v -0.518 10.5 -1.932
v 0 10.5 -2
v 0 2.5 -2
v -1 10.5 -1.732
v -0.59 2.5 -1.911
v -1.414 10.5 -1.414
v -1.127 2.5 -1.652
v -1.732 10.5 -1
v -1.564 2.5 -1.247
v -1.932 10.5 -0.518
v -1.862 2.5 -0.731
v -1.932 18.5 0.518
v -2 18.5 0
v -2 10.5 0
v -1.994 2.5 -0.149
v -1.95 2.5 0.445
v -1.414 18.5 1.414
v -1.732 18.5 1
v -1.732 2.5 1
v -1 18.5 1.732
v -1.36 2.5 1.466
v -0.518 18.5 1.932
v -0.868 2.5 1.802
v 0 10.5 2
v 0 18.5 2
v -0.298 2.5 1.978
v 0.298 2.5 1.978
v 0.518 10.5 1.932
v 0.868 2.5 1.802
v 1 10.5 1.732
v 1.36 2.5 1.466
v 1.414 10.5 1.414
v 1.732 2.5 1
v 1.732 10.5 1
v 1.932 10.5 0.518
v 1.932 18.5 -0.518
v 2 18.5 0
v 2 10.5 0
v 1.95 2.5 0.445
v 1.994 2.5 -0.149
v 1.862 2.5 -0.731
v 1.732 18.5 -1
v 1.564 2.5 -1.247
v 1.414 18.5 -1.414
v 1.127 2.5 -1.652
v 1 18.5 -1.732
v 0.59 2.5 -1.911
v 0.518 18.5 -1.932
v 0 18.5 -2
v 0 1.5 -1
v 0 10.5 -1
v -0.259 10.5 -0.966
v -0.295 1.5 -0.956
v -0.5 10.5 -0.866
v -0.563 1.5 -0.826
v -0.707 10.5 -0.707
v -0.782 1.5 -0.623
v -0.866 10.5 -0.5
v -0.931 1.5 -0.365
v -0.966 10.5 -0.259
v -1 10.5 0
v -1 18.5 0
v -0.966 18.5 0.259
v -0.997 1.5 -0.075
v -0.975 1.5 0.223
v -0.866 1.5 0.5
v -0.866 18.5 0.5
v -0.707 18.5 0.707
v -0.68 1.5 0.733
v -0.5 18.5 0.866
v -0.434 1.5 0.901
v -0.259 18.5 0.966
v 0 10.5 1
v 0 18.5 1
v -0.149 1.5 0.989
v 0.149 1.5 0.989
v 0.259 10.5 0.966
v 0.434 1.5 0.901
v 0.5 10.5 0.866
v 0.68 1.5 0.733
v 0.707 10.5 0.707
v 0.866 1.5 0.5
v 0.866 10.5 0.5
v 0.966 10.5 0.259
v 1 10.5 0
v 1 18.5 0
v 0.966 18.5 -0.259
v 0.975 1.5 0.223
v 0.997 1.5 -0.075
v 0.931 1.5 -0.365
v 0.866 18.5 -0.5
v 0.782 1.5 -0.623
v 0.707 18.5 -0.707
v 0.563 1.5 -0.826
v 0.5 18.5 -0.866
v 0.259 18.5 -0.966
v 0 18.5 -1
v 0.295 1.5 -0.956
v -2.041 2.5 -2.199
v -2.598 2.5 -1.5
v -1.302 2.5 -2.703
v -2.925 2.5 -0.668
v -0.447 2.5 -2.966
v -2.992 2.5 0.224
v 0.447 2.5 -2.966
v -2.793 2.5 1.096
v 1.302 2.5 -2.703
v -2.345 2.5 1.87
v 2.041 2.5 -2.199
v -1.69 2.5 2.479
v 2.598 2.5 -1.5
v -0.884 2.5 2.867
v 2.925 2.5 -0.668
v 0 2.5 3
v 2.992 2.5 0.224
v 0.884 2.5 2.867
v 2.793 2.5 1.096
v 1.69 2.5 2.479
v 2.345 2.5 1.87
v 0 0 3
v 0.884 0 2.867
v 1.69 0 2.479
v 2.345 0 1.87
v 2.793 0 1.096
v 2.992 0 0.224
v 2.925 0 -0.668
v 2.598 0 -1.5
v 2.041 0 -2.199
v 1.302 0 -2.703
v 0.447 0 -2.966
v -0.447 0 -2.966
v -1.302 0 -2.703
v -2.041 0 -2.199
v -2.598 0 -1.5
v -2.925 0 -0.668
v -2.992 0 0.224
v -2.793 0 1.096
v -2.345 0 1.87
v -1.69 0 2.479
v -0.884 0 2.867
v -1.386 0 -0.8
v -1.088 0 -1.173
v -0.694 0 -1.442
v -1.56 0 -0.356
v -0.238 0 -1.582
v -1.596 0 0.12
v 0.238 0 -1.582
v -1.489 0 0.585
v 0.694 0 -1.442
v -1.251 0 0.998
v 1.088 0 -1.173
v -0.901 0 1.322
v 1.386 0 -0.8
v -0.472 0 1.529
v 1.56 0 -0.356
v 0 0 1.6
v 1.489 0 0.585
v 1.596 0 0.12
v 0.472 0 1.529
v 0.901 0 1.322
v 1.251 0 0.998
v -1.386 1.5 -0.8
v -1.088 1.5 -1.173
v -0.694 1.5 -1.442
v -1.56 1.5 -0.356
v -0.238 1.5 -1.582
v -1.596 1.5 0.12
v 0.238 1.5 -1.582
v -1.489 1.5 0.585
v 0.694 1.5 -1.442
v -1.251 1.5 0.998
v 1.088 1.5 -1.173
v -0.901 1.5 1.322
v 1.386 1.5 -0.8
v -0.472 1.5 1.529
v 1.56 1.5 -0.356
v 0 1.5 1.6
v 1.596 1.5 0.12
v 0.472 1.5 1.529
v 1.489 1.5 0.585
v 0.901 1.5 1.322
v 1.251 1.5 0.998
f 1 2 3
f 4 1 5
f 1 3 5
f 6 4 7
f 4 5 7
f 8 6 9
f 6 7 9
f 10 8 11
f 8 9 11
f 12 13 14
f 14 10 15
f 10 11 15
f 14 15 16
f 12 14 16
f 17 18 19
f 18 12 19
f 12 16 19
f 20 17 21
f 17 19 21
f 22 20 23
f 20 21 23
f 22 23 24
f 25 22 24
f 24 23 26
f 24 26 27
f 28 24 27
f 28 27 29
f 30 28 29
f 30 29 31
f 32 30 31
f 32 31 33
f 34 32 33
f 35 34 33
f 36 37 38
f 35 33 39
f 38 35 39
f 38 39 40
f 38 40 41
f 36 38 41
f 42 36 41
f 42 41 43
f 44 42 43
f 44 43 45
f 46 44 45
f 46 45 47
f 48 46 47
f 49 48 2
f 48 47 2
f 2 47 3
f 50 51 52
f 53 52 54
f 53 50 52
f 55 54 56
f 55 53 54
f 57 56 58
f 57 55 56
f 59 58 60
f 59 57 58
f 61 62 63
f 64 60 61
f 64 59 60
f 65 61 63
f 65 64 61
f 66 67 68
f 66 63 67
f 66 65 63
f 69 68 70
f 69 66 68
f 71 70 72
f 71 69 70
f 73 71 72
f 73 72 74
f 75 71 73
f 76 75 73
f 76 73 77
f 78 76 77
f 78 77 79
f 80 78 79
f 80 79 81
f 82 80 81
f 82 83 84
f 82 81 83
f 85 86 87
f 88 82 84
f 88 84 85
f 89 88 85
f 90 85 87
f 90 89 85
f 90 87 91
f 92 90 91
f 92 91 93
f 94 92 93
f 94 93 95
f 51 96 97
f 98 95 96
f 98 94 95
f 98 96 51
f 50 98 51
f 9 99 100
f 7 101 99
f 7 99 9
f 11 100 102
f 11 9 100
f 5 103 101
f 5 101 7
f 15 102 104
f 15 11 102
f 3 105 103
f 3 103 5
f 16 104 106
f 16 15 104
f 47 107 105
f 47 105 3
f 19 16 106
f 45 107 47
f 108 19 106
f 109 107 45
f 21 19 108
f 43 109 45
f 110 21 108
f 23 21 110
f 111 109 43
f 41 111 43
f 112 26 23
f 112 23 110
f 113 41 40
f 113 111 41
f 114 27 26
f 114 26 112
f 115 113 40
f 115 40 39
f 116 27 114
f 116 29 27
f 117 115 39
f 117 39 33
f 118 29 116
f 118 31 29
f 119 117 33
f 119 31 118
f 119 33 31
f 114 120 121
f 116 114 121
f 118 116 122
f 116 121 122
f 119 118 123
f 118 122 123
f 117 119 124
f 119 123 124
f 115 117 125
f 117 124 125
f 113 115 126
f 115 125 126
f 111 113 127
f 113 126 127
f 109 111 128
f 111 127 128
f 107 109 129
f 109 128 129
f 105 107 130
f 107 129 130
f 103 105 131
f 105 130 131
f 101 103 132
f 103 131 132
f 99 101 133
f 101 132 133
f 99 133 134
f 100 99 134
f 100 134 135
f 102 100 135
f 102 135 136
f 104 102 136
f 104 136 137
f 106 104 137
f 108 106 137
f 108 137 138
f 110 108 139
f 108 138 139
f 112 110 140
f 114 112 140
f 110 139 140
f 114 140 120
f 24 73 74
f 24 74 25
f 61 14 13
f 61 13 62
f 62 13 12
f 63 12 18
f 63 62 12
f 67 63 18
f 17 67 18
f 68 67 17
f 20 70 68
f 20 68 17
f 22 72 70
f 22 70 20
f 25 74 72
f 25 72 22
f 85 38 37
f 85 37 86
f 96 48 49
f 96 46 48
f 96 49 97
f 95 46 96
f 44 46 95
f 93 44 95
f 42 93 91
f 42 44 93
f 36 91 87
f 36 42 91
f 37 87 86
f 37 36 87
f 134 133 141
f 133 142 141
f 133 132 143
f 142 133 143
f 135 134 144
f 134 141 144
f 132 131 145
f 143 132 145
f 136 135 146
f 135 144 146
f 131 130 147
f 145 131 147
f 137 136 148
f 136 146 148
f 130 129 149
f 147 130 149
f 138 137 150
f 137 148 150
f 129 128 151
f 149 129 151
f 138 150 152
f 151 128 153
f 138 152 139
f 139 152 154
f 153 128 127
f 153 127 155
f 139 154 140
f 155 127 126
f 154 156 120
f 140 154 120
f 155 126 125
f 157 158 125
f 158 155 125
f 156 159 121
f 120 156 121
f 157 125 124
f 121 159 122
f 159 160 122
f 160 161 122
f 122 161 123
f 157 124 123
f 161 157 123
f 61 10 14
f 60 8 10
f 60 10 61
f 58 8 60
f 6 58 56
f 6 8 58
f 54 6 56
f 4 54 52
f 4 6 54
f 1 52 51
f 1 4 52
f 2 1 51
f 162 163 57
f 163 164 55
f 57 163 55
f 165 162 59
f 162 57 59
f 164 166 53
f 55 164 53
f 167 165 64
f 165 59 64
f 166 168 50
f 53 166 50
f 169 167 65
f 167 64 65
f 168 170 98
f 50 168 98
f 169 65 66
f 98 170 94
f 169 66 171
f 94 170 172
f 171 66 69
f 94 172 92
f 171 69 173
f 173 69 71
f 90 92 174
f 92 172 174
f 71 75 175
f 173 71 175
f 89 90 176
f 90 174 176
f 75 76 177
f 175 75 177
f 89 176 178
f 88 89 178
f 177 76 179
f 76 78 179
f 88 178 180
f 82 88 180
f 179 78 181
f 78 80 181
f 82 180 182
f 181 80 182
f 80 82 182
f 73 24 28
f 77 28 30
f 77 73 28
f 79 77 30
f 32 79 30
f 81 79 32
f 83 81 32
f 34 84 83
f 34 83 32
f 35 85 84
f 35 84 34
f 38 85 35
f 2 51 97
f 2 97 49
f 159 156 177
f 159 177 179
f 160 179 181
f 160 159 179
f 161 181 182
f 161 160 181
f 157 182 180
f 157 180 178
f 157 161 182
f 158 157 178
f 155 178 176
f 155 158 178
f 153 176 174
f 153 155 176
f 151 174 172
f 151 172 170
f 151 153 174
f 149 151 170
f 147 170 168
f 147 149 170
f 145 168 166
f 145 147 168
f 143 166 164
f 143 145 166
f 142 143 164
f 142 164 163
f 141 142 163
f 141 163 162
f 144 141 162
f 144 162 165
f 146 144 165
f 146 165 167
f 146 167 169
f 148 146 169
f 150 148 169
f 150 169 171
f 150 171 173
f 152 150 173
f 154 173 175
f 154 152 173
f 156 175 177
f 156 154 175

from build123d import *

# Parameters (mm, degrees)
SKETCH_1_R          = 2
SKETCH_1_R_2        = 1
EXTRUDE_1_DEPTH     = 29
SKETCH_2_R          = 3
SKETCH_2_R_2        = 2
EXTRUDE_2_DEPTH     = 2.5
EXTRUDE_START       = 26.5
SKETCH_3_R          = 3
SKETCH_3_R_2        = 2
EXTRUDE_3_DEPTH     = 2.5
SKETCH_4_R          = 1.6
CUT_EXTRUDE_1_DEPTH = 1.5
CUT_EXTRUDE_START   = 29
CUT_EXTRUDE_2_DEPTH = 1.6
CUT_EXTRUDE_START_2 = 18.5
SKETCH_7_R          = 3
CUT_EXTRUDE_3_DEPTH = 10.5
CUT_EXTRUDE_START_3 = 10.5
CUT_EXTRUDE_5_DEPTH = 8


with BuildPart() as part:
    # 草图1 → 凸台-拉伸1 (new body)
    with BuildSketch(Plane(origin=(0, 0, 0), x_dir=(1, 0, 0), z_dir=(0, 1, 0))):
        with Locations(Location((0, 0, 0), (0, 0, 90))):
            Circle(SKETCH_1_R)
        with Locations(Location((0, 0, 0), (0, 0, 90))):
            Circle(SKETCH_1_R_2, mode=Mode.SUBTRACT)
    extrude(amount=EXTRUDE_1_DEPTH)

    # 草图2 → 凸台-拉伸2 (add)
    with BuildSketch(Plane(origin=(0, 0, 0), x_dir=(1, 0, 0), z_dir=(0, 1, 0))):
        with Locations(Location((0, 0, 0), (0, 0, 270))):
            Circle(SKETCH_2_R)
        with Locations(Location((0, 0, 0), (0, 0, 90))):
            Circle(SKETCH_2_R_2, mode=Mode.SUBTRACT)
    extrude(amount=EXTRUDE_2_DEPTH)

    # 草图3 → 凸台-拉伸3 (add)
    with BuildSketch(Plane(origin=(0, 0, 0), x_dir=(1, 0, 0), z_dir=(0, 1, 0)).offset(EXTRUDE_START)):
        with Locations(Location((0, 0, 0), (0, 0, 270))):
            Circle(SKETCH_3_R)
        with Locations(Location((0, 0, 0), (0, 0, 90))):
            Circle(SKETCH_3_R_2, mode=Mode.SUBTRACT)
    extrude(amount=EXTRUDE_3_DEPTH)

    # 草图4 → 切除-拉伸1 (cut)
    with BuildSketch(Plane(origin=(0, 0, 0), x_dir=(1, 0, 0), z_dir=(0, 1, 0))):
        with Locations(Location((0, 0, 0), (0, 0, 270))):
            Circle(SKETCH_4_R)
    extrude(amount=CUT_EXTRUDE_1_DEPTH, mode=Mode.SUBTRACT)

    # 草图5 → 切除-拉伸2 (cut)
    with BuildSketch(Plane(origin=(0, 0, 0), x_dir=(1, 0, 0), z_dir=(0, 1, 0)).offset(CUT_EXTRUDE_START)):
        Polygon((0, -2.309401077), (2, -1.154700538), (2, 1.154700538), (0, 2.309401077), (-2, 1.154700538), (-2, -1.154700538), align=None)
    extrude(amount=-CUT_EXTRUDE_2_DEPTH, mode=Mode.SUBTRACT)

    # 草图7 → 切除-拉伸3 (cut)
    with BuildSketch(Plane(origin=(0, 0, 0), x_dir=(1, 0, 0), z_dir=(0, 1, 0)).offset(CUT_EXTRUDE_START_2)):
        with Locations(Location((0, 0, 0), (0, 0, 270))):
            Circle(SKETCH_7_R)
    extrude(amount=CUT_EXTRUDE_3_DEPTH, mode=Mode.SUBTRACT)

    # 草图8 → 切除-拉伸5 (cut)
    with BuildSketch(Plane(origin=(0, 0, 0), x_dir=(1, 0, 0), z_dir=(0, 1, 0)).offset(CUT_EXTRUDE_START_3)):
        with BuildLine():
            ThreePointArc((0, -2), (1.414213562, -1.414213562), (2, 0))
            Line((2, 0), (0, 0))
            Line((0, 0), (0, -2))
        make_face()
        with BuildLine():
            Line((-2, 0), (0, 0))
            Line((0, 0), (0, 2))
            ThreePointArc((0, 2), (-1.414213562, 1.414213562), (-2, 0))
        make_face()
    extrude(amount=CUT_EXTRUDE_5_DEPTH, mode=Mode.SUBTRACT)


solid = part.part
